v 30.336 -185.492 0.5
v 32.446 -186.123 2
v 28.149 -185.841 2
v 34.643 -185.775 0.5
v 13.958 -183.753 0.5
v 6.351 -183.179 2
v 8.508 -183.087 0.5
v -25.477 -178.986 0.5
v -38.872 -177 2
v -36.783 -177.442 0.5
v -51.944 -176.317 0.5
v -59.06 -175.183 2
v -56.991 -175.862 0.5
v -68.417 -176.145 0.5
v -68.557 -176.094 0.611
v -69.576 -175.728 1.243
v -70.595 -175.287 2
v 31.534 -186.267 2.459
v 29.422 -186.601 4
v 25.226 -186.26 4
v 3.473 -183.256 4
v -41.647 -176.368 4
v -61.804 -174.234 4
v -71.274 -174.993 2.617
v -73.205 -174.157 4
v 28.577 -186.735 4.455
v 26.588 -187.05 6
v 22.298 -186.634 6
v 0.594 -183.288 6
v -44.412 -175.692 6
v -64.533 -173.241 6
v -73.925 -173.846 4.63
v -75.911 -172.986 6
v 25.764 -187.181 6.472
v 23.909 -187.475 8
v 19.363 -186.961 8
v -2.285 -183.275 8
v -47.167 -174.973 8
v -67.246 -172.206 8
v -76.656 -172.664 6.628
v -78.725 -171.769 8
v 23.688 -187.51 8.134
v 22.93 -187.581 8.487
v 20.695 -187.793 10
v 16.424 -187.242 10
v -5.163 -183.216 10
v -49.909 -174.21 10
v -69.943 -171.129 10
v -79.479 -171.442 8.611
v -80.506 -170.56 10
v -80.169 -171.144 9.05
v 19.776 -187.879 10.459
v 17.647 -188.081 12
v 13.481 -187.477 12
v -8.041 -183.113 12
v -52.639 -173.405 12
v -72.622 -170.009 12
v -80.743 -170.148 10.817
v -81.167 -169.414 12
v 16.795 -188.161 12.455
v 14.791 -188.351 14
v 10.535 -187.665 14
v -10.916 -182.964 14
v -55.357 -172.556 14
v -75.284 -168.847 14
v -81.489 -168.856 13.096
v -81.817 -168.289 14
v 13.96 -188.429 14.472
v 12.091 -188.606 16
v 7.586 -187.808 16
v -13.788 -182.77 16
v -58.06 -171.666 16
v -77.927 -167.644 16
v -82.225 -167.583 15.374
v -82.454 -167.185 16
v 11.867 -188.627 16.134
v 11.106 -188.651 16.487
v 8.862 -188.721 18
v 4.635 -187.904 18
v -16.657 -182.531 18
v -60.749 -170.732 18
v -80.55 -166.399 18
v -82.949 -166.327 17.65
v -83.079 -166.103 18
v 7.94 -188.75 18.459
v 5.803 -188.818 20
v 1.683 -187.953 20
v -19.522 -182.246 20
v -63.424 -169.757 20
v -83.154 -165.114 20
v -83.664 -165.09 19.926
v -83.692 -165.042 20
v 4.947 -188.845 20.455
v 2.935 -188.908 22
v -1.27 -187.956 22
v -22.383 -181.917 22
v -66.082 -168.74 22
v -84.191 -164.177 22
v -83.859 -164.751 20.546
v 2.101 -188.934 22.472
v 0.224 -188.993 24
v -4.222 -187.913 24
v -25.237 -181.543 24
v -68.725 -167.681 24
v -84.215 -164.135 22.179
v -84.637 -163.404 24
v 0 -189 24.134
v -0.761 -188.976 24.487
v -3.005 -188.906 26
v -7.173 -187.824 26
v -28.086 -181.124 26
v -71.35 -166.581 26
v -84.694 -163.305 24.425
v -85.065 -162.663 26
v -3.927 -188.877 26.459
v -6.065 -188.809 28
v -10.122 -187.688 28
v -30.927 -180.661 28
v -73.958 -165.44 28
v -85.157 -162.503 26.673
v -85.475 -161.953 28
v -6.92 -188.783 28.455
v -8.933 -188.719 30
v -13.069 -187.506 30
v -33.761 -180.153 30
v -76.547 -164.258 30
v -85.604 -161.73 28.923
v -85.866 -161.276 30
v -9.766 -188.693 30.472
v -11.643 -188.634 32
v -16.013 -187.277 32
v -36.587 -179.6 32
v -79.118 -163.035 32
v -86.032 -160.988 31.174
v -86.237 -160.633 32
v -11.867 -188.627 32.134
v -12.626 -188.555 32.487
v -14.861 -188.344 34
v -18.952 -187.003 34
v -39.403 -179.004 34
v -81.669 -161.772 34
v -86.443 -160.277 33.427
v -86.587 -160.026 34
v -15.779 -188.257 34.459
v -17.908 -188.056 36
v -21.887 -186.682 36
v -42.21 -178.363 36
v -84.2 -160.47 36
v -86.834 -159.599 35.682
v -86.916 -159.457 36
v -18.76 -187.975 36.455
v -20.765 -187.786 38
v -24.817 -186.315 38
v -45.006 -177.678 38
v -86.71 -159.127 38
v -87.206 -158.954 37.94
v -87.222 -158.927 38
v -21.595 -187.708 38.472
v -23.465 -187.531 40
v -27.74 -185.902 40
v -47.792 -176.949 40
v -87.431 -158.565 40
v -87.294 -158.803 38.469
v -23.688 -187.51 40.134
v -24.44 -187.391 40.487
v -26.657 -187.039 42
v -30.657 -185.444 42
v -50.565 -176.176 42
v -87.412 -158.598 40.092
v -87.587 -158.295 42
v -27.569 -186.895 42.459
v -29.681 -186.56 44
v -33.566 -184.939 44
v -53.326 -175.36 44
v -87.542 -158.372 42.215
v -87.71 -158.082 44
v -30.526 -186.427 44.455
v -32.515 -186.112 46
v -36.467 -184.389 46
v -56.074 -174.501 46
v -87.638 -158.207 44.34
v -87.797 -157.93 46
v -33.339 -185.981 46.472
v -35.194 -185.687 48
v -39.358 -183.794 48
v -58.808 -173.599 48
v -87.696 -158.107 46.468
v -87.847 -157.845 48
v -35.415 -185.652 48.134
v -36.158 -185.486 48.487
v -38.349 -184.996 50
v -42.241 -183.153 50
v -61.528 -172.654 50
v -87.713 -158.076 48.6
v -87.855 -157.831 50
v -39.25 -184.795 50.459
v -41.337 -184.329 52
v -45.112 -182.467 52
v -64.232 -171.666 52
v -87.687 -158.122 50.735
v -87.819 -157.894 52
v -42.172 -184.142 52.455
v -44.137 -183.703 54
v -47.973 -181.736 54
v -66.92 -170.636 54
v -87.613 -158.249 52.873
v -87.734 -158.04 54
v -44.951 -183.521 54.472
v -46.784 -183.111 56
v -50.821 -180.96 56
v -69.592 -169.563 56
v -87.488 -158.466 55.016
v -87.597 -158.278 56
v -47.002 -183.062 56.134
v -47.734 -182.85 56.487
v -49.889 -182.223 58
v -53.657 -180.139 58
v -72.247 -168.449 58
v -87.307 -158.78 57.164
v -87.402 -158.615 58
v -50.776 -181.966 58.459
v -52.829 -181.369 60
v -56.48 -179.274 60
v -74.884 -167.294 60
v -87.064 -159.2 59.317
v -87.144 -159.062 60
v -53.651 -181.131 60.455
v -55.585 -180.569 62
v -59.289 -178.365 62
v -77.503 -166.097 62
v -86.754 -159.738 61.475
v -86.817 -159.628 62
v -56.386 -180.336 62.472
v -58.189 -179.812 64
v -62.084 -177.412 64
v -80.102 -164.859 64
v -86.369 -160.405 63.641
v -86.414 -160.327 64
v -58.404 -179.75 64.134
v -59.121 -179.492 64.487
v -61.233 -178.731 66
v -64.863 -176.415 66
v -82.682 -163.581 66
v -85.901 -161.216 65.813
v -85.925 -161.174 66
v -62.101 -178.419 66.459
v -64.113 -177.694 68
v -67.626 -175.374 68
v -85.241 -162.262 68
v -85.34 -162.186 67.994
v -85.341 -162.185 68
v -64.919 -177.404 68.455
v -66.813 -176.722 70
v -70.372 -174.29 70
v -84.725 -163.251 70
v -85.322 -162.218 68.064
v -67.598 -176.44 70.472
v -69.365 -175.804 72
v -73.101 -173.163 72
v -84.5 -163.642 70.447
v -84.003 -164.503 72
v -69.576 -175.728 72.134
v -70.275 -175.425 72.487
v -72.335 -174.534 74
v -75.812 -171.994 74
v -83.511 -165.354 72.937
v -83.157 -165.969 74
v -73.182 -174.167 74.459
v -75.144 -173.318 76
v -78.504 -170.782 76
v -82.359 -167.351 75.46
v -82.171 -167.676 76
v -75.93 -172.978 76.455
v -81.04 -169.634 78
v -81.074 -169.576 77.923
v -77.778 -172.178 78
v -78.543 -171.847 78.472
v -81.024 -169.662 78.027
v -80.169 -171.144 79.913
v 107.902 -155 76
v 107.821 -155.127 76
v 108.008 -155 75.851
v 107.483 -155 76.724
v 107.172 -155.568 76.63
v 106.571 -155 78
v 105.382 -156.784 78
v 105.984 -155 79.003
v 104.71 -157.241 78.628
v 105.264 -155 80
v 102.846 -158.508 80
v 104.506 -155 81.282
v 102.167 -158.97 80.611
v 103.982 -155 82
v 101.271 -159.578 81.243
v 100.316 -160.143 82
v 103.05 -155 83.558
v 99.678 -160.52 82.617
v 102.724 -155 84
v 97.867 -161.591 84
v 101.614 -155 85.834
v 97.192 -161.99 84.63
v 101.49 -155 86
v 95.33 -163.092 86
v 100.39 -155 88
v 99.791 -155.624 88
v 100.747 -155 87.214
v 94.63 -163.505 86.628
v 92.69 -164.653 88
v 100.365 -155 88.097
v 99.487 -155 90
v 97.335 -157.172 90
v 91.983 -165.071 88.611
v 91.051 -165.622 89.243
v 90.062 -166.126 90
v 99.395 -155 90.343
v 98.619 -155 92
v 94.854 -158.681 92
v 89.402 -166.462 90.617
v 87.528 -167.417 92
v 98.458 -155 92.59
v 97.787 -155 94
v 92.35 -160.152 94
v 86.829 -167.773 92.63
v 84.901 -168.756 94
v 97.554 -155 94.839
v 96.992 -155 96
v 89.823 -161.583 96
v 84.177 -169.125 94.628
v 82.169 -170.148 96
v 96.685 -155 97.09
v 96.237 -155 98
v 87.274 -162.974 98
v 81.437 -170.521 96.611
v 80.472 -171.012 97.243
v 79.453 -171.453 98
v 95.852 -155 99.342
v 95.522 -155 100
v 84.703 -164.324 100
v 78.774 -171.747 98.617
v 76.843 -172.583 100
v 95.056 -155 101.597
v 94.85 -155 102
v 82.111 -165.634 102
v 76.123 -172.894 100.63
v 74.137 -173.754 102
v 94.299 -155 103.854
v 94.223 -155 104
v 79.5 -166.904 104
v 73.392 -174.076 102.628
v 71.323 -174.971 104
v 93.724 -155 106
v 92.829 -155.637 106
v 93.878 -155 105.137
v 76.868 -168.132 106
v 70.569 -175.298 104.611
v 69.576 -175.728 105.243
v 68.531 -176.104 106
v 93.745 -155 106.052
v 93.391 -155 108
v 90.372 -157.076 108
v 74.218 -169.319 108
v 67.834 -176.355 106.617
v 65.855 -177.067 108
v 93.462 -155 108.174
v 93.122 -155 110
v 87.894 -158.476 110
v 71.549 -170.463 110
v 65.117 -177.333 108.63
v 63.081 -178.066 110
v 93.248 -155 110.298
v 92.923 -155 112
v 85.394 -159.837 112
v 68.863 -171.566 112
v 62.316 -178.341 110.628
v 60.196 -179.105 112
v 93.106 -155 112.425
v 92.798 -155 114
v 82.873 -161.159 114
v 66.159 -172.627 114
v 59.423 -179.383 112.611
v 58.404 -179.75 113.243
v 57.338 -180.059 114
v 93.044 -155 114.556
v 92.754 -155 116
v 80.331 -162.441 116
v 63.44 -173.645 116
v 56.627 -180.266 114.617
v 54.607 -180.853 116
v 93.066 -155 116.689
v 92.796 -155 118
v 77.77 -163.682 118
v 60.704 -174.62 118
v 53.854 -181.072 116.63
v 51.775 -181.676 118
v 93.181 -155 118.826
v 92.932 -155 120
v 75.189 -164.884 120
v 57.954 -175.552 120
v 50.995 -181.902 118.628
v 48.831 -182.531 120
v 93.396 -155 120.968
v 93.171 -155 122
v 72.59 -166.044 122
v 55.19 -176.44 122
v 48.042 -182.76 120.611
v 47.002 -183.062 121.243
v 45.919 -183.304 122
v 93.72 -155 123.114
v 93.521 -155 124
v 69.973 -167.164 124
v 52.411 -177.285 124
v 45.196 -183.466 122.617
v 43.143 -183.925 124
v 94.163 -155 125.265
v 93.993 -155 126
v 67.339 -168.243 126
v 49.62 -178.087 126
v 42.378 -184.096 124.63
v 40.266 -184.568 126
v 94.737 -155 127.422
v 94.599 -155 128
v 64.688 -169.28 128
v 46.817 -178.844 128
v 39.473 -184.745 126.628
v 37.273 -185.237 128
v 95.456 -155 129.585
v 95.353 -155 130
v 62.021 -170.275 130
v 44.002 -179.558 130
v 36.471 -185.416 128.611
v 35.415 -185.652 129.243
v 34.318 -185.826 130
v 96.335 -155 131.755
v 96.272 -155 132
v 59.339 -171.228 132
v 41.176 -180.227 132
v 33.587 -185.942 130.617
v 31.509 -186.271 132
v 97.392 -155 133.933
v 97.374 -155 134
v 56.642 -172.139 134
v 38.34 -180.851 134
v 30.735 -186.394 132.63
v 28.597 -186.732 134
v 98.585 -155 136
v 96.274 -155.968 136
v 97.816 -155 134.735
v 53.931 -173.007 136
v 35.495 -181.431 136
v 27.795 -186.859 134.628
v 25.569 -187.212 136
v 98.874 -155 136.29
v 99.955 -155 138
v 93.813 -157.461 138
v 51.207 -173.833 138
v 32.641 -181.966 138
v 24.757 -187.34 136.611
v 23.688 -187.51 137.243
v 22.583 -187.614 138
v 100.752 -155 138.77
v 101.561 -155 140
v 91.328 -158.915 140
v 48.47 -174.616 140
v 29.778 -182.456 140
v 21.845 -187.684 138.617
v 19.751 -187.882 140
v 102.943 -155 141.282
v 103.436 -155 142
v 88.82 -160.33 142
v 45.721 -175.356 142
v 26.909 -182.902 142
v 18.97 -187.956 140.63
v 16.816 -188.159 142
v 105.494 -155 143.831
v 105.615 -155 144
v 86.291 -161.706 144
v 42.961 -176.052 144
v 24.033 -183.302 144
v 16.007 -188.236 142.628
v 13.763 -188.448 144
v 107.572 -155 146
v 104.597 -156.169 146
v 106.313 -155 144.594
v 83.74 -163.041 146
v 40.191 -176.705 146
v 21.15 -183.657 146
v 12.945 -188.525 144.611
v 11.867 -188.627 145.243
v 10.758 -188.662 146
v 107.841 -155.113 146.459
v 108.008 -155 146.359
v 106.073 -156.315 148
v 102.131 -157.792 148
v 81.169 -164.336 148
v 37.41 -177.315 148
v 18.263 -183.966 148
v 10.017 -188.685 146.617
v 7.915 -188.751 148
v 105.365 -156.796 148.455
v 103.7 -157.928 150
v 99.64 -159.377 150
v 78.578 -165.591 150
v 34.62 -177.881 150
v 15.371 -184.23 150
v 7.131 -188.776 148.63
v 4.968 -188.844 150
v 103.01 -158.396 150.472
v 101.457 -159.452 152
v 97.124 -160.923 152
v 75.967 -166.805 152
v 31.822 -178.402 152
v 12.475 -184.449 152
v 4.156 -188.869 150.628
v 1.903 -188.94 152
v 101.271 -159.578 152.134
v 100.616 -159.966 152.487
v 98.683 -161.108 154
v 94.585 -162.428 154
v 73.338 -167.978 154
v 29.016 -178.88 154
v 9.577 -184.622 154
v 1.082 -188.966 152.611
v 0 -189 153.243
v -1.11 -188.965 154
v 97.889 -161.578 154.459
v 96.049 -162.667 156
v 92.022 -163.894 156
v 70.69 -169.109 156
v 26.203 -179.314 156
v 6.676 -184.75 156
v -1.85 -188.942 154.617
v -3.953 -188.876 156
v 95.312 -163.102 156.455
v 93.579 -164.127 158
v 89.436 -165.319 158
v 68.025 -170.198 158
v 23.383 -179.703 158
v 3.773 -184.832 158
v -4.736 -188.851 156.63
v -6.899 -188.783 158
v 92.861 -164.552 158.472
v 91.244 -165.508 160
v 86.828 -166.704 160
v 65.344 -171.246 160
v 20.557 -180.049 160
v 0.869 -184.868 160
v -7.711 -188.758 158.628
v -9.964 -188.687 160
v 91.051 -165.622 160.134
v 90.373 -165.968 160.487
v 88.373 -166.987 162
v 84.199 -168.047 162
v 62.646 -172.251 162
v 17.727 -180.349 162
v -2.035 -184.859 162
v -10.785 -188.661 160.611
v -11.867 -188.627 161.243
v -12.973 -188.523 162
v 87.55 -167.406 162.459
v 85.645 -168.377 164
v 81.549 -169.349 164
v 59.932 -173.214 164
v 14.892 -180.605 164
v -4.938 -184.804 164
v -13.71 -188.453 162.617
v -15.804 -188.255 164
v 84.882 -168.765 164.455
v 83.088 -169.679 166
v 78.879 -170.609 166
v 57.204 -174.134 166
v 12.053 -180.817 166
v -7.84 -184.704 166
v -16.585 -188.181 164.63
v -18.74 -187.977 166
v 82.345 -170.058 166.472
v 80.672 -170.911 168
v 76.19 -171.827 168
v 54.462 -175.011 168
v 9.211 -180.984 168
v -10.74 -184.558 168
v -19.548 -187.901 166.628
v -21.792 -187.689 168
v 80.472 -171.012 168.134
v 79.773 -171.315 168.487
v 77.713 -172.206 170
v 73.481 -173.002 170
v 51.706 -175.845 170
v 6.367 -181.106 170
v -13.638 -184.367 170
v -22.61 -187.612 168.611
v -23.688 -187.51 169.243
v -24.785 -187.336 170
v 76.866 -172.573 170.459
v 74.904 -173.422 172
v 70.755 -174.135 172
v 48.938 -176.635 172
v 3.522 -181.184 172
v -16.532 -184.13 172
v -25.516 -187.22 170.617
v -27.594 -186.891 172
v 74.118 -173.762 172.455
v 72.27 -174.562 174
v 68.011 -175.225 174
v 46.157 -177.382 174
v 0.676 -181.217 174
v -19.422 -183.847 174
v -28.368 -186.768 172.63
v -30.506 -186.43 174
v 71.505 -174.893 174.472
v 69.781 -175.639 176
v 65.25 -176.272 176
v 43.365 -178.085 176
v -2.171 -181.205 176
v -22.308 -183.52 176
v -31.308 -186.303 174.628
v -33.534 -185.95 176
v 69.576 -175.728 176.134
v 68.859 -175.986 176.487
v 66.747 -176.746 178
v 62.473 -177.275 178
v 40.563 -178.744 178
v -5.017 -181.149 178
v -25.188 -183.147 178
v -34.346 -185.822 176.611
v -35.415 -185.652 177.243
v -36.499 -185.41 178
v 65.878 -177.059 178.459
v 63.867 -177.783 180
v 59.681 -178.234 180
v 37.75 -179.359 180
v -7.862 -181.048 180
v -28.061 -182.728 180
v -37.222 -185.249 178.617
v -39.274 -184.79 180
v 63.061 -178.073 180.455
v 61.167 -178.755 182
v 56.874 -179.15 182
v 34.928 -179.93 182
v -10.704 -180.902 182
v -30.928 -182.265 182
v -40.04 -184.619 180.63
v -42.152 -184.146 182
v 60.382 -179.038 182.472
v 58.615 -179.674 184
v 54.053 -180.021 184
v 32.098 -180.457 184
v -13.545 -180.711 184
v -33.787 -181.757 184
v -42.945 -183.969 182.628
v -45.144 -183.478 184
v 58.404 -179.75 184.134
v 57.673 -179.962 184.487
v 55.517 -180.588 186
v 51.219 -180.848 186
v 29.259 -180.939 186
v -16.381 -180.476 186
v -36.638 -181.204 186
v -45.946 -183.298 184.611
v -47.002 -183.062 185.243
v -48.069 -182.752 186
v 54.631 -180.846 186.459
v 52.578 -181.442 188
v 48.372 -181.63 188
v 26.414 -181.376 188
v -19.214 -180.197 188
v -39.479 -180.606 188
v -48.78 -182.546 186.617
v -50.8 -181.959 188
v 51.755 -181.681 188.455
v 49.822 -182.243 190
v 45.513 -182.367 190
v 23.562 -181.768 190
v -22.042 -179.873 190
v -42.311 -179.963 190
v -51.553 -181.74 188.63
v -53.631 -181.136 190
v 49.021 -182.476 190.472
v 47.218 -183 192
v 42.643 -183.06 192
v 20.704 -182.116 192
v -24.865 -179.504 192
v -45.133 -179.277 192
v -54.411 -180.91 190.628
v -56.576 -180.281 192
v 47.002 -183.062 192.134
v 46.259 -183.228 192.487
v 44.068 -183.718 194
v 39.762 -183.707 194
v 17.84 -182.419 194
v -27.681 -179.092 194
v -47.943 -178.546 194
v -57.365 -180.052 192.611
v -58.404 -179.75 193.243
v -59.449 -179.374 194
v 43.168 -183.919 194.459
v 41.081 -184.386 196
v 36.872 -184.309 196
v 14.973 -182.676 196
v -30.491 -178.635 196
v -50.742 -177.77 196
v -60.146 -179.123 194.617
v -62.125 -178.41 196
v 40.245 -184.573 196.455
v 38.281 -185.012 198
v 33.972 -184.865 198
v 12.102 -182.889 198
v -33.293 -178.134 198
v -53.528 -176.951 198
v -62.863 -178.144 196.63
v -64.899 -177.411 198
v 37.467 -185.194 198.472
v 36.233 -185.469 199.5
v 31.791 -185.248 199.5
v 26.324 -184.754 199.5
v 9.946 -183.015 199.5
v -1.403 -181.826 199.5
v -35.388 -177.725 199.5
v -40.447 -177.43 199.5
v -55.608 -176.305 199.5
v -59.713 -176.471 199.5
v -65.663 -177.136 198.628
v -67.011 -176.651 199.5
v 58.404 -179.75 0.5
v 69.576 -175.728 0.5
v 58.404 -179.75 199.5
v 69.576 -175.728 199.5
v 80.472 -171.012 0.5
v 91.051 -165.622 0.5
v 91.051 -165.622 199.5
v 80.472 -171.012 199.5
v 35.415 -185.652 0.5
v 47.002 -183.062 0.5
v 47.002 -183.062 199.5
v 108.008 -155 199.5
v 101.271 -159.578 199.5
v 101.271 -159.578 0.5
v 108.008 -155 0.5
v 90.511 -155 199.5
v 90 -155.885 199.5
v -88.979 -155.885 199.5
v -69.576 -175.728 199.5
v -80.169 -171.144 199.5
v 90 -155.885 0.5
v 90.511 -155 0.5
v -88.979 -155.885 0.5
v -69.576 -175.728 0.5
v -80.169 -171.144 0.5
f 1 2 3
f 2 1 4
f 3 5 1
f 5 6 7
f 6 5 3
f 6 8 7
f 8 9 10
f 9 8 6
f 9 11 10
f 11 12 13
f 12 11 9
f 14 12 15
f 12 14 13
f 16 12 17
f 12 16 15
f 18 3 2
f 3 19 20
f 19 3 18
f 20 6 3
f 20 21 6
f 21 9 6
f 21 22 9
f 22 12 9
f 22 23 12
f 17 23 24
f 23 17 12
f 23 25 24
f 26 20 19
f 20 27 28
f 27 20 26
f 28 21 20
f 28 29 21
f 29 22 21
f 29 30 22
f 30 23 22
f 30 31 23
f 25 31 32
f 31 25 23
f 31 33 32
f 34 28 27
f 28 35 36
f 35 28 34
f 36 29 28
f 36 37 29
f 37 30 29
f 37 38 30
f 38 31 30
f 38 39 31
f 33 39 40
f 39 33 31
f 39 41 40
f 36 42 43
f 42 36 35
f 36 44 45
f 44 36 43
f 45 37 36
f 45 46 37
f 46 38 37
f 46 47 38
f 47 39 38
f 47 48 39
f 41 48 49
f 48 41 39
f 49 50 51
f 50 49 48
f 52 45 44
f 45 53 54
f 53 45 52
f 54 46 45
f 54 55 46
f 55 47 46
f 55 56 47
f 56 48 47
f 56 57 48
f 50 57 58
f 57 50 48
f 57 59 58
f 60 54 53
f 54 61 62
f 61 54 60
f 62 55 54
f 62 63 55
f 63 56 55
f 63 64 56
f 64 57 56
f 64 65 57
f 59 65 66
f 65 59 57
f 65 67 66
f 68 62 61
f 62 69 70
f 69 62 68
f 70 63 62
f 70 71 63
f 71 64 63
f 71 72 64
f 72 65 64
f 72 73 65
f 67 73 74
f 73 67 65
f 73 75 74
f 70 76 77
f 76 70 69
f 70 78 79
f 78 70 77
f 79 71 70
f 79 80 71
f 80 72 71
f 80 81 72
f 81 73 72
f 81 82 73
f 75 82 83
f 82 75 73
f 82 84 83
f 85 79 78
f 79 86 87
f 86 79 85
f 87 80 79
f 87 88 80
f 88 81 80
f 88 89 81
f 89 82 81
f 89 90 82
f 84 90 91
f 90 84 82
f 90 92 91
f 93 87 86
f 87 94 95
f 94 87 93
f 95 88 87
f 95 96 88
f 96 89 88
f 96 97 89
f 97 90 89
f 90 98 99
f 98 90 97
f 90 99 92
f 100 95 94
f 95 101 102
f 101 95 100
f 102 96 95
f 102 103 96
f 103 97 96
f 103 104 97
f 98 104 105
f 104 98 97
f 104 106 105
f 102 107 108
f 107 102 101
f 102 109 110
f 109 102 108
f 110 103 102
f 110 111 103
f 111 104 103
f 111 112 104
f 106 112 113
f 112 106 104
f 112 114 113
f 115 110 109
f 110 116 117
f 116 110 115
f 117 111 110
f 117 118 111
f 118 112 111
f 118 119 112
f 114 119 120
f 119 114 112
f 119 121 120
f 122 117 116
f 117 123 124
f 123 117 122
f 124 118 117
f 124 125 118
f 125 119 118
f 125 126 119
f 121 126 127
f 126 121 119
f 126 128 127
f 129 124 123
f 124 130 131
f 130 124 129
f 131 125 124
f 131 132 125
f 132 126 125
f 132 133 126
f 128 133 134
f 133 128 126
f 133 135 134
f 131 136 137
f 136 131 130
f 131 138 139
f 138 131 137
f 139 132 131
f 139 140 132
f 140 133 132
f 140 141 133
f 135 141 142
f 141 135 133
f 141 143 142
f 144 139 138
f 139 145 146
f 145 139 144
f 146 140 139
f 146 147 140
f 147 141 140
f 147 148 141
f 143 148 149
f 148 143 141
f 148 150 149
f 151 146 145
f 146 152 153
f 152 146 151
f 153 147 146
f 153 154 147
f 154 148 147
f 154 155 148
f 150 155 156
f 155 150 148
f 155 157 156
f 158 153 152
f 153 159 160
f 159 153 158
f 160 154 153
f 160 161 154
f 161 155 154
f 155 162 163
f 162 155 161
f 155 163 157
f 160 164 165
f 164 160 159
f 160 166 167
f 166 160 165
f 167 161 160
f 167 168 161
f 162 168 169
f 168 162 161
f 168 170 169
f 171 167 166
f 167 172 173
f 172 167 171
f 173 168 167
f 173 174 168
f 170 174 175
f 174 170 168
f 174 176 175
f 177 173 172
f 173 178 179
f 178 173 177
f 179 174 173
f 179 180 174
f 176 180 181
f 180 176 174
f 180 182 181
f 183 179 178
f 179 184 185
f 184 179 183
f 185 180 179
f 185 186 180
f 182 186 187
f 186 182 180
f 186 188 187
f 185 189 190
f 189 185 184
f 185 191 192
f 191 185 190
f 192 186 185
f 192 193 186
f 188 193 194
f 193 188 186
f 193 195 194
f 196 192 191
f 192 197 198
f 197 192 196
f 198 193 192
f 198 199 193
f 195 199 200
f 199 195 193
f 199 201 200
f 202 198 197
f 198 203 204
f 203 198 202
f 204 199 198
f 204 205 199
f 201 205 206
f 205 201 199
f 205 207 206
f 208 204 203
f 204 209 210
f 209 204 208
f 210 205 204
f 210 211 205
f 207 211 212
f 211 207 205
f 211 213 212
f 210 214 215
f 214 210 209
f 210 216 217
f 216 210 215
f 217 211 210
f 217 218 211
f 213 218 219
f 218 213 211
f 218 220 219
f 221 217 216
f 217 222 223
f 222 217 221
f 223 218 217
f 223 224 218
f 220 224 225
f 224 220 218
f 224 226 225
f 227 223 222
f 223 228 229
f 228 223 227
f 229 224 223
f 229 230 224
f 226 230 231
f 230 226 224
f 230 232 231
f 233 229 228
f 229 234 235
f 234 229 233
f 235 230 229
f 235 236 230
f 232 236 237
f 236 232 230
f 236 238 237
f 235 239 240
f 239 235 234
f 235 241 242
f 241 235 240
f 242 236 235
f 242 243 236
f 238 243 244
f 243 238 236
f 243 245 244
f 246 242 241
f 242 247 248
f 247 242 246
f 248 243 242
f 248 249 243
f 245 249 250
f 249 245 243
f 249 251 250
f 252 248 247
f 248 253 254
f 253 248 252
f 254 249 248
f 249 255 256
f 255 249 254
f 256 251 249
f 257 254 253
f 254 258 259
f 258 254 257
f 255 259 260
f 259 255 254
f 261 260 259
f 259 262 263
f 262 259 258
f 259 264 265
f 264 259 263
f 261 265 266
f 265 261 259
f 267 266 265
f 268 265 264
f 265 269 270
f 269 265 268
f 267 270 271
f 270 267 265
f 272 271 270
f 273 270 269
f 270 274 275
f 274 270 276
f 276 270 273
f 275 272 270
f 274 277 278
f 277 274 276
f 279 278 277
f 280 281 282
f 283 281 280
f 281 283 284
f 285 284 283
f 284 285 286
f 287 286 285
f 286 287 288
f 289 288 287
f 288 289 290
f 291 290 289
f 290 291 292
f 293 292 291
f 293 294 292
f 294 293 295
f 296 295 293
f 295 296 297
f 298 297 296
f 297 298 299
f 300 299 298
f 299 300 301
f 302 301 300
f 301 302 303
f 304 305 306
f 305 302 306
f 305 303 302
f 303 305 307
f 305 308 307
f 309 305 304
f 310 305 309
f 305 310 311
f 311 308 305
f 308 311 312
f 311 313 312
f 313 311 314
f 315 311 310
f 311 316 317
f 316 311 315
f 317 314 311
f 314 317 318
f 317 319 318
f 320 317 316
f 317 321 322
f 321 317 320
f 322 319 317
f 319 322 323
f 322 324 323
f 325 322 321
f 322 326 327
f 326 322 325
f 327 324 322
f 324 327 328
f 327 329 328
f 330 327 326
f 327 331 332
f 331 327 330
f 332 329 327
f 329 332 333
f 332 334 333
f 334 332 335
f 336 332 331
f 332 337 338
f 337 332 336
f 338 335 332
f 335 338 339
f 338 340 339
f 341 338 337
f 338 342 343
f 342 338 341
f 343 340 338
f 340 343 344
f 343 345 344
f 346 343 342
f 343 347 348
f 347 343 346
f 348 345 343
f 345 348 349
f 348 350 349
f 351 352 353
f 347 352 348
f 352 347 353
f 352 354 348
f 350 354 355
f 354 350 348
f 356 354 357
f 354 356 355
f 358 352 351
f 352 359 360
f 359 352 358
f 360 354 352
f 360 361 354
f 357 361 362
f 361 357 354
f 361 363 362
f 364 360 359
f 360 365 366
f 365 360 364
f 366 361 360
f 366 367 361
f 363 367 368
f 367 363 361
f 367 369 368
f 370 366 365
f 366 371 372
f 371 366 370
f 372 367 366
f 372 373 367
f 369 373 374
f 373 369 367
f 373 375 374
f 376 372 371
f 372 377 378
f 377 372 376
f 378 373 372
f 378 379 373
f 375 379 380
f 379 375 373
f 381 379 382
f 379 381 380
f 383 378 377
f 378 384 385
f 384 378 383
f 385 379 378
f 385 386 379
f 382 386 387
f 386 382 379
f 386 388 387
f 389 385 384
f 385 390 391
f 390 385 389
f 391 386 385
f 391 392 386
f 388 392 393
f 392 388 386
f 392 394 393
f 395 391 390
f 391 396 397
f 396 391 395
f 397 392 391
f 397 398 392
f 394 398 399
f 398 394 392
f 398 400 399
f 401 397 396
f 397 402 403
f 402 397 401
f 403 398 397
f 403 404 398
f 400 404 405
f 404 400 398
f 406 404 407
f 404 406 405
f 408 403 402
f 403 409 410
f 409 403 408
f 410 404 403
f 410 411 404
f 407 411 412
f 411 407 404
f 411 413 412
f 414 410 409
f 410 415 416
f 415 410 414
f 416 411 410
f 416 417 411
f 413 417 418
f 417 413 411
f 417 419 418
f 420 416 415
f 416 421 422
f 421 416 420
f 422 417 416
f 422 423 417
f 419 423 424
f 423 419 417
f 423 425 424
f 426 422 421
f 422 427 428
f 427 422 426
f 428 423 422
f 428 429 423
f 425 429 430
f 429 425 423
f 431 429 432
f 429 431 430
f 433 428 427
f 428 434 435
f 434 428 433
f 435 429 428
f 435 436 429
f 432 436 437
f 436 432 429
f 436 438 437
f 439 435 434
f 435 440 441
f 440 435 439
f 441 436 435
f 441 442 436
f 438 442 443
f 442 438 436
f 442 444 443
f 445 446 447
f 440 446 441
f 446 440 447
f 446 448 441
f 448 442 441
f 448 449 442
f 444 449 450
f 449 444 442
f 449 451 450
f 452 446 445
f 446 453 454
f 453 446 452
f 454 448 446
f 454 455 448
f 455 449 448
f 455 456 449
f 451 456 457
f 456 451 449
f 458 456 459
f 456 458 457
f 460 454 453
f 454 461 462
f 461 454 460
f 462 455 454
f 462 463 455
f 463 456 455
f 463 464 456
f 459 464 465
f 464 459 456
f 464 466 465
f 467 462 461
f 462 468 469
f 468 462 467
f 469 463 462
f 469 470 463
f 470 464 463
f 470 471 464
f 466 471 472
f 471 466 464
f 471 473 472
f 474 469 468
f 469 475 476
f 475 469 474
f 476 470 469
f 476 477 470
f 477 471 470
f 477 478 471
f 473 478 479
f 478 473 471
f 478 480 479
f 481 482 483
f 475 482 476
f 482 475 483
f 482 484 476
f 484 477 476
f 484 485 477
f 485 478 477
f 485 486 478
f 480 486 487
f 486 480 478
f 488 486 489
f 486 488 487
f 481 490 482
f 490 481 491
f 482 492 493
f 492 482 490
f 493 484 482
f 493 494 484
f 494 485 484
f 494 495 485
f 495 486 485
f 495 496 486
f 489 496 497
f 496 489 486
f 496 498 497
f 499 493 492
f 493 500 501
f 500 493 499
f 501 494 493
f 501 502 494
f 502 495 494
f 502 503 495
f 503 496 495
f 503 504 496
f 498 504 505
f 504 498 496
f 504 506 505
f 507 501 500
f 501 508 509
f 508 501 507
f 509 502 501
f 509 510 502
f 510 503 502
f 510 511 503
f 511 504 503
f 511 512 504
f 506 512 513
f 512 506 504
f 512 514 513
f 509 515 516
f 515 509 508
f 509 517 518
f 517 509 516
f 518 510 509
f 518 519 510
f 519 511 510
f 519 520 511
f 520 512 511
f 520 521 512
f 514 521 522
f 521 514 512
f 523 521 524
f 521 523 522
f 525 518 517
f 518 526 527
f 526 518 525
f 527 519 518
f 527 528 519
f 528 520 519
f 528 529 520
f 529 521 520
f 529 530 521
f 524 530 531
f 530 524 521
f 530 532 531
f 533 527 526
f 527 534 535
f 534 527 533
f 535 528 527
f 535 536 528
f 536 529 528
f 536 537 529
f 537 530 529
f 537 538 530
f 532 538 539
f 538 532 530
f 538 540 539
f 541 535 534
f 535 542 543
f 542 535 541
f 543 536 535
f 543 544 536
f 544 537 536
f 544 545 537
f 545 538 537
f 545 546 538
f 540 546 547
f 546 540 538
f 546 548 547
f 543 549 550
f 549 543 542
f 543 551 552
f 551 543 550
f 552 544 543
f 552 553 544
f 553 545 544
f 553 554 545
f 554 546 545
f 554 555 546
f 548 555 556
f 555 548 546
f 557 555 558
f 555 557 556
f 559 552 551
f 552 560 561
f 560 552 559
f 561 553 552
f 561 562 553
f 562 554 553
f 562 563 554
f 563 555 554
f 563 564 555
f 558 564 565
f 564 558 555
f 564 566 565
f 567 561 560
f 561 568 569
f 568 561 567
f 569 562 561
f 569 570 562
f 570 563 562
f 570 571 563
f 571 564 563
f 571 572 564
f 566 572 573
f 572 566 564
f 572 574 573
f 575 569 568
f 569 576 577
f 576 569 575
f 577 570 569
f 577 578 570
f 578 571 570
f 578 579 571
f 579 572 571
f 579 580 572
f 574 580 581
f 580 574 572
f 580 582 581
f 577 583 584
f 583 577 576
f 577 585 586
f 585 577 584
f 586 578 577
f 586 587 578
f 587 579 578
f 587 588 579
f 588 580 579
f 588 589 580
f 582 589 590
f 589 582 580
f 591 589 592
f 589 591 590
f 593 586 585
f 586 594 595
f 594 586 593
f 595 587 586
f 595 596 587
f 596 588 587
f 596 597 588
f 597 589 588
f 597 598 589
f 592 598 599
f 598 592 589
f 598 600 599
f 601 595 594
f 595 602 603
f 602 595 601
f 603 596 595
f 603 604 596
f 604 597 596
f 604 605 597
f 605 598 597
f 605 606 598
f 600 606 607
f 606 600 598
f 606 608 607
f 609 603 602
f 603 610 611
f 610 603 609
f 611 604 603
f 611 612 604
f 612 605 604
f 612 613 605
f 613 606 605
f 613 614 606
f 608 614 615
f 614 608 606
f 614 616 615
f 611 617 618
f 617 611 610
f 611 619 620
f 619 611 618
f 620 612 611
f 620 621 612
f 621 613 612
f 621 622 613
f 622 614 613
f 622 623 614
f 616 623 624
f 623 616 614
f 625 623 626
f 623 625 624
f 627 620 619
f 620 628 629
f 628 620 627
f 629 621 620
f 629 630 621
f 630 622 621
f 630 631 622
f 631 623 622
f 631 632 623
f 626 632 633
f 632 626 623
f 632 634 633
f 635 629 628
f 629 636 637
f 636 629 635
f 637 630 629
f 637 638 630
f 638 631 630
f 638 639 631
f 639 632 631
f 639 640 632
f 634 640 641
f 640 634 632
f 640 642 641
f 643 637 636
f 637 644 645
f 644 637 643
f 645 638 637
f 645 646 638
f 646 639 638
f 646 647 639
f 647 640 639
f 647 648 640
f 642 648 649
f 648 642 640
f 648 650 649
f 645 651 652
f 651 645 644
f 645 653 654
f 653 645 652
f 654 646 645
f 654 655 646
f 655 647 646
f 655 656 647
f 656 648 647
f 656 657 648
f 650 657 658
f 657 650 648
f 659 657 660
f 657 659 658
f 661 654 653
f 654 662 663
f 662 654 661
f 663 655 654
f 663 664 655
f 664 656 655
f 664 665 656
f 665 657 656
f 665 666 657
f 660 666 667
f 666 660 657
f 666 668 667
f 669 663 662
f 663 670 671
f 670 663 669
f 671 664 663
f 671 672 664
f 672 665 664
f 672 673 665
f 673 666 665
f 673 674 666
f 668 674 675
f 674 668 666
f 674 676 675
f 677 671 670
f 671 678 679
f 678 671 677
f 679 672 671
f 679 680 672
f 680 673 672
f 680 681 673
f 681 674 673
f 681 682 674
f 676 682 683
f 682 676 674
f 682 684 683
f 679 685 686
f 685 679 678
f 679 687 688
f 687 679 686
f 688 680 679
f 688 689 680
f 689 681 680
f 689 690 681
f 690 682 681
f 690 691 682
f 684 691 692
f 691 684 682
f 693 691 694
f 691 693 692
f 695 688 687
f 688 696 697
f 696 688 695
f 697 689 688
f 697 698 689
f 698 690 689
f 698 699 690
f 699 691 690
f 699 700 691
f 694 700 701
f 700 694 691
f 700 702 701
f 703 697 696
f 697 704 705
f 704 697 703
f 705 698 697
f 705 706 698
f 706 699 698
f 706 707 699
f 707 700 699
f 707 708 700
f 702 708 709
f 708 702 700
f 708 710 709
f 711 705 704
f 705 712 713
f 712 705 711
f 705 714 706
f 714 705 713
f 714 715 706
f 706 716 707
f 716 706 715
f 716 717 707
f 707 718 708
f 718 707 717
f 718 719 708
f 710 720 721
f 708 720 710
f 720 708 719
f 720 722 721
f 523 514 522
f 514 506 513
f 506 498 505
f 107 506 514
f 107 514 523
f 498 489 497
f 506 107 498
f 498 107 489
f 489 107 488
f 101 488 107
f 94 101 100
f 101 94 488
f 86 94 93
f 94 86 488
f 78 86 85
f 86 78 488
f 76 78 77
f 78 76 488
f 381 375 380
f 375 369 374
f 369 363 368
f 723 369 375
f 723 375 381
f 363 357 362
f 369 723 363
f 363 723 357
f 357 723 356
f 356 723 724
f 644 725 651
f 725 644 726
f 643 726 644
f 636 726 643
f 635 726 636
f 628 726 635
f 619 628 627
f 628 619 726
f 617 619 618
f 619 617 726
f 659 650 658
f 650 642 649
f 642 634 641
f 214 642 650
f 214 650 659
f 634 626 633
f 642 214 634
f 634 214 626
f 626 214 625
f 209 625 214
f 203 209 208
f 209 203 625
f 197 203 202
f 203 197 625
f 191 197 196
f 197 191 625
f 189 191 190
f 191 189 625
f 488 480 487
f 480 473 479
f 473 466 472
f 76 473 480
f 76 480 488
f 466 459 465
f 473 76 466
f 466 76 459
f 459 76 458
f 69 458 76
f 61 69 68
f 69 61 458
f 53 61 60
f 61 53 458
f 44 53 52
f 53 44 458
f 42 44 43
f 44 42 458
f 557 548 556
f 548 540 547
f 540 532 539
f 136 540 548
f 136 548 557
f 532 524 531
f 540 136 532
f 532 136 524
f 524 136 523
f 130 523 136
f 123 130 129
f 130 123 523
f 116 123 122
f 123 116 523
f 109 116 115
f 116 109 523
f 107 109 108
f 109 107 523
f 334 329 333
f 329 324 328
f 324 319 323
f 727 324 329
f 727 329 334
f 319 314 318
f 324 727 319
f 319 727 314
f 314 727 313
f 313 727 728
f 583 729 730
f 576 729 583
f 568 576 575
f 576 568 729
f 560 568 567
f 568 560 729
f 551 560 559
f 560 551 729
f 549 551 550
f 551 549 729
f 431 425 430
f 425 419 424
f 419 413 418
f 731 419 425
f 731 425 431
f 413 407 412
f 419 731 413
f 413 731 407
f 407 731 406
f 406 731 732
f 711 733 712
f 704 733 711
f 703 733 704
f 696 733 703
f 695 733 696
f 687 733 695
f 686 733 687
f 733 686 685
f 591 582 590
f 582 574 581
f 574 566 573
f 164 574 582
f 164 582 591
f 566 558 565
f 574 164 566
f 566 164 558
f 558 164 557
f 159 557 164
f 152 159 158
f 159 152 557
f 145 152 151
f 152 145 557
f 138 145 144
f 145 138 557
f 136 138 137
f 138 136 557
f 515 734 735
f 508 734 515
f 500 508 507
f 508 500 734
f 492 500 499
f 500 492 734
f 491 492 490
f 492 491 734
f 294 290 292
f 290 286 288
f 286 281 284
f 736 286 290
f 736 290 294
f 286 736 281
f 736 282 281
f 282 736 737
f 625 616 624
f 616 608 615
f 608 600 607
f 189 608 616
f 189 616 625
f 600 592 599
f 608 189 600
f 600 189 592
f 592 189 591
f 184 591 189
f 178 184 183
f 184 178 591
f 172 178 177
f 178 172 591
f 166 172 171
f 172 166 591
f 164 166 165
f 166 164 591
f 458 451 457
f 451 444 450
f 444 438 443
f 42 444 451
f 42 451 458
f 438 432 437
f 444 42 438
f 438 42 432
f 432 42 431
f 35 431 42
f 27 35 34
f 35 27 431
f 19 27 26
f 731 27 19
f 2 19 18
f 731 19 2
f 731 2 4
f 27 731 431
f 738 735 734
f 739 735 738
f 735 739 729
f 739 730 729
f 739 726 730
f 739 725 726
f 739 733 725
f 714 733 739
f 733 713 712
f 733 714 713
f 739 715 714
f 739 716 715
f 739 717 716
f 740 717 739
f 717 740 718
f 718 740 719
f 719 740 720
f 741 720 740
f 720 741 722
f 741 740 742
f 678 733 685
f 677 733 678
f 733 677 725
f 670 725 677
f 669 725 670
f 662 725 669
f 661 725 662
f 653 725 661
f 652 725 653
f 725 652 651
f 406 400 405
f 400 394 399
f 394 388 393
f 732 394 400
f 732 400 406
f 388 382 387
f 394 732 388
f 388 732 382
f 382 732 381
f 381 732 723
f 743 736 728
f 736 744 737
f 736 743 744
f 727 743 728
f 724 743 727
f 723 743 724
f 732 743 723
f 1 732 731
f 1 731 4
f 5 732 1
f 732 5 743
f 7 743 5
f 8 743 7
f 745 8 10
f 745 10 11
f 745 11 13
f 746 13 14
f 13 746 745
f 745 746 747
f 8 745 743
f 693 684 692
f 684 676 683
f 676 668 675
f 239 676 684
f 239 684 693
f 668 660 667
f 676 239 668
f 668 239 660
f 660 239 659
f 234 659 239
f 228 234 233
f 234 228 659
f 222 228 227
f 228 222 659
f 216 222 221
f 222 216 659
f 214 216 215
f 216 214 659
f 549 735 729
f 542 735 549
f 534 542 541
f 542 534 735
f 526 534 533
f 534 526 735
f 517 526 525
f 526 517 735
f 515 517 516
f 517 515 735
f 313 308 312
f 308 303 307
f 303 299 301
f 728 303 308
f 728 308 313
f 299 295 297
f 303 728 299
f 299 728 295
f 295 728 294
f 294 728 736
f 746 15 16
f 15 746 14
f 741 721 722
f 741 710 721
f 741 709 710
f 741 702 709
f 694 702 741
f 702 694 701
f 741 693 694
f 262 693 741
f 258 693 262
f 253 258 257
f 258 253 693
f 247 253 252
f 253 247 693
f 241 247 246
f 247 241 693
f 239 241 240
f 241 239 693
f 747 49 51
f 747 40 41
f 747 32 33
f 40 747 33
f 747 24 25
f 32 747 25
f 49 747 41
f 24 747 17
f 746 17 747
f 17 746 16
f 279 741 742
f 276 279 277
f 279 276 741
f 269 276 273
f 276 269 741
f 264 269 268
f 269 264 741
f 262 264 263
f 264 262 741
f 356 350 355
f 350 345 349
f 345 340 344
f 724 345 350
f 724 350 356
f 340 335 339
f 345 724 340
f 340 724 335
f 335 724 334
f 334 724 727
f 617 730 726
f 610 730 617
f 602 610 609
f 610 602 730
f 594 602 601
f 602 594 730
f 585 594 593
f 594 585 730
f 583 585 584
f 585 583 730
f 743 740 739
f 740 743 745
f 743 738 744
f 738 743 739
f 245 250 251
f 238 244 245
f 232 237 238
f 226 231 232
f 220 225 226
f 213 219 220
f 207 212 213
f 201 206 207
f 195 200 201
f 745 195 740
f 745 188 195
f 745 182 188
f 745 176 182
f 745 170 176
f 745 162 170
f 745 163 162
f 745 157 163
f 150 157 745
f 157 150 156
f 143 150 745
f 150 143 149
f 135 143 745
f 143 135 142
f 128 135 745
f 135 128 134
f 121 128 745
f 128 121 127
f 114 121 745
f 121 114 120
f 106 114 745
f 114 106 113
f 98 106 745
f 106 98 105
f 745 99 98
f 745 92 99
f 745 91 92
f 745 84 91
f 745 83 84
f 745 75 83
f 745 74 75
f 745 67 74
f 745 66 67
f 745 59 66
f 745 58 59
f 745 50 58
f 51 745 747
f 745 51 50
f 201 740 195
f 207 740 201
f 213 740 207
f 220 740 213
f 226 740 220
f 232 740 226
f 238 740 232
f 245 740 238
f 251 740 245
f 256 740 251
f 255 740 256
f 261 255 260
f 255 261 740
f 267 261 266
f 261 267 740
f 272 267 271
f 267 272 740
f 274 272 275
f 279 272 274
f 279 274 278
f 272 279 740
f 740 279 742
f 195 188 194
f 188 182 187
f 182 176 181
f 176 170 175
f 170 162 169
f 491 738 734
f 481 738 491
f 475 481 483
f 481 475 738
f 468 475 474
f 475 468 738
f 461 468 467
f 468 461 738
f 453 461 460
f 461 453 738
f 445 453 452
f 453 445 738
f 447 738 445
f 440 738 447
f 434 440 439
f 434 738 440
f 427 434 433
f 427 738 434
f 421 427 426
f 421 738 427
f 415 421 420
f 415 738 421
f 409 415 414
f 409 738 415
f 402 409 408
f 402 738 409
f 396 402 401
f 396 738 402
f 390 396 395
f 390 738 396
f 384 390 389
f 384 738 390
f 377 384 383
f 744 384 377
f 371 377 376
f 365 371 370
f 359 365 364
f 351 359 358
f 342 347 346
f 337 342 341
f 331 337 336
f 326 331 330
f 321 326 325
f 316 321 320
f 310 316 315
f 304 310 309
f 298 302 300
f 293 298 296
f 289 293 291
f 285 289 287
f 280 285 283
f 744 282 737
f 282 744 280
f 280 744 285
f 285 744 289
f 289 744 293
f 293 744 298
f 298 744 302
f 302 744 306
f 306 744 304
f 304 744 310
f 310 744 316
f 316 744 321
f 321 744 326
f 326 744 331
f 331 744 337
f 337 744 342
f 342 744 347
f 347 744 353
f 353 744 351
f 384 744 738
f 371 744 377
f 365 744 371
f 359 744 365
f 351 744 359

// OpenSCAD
intersection() {
difference() {
translate([0,0,100]) {cylinder (r = 189, h = 199, $fn = 100, center = true);}

union() {
linear_extrude(height = 200, twist = 90, $fn = 400) translate([-50,-100,0]){import(file = "wing.dxf", center = false, $fn = 100);} rotate([0,30,0]);

rotate([0,0,90]) {linear_extrude(height = 200, twist = 90, $fn = 400) translate([-50,-100,0]){import(file = "wing.dxf", center = false, $fn = 100);} rotate([0,30,0]);}

rotate([0,0,180]) {linear_extrude(height = 200, twist = 90, $fn = 400) translate([-50,-100,0]){import(file = "wing.dxf", center = false, $fn = 100);} rotate([0,30,0]);}

rotate([0,0,270]) {linear_extrude(height = 200, twist = 90, $fn = 400) translate([-50,-100,0]){import(file = "wing.dxf", center = false, $fn = 100);} rotate([0,30,0]);}
}

cylinder(h = 400, r = 180, center = true, $fn = 6);

translate ([0,175,100]){cube ([400,40,200], center = true);}

rotate([0,0,60]) {translate ([0,175,100]){cube ([400,40,200], center = true);}}

rotate([0,0,120]) {translate ([0,175,100]){cube ([400,40,200], center = true);}}
}


rotate([0,0,180]) {translate ([0,175,100]){cube ([400,40,200], center = true);}}
}
